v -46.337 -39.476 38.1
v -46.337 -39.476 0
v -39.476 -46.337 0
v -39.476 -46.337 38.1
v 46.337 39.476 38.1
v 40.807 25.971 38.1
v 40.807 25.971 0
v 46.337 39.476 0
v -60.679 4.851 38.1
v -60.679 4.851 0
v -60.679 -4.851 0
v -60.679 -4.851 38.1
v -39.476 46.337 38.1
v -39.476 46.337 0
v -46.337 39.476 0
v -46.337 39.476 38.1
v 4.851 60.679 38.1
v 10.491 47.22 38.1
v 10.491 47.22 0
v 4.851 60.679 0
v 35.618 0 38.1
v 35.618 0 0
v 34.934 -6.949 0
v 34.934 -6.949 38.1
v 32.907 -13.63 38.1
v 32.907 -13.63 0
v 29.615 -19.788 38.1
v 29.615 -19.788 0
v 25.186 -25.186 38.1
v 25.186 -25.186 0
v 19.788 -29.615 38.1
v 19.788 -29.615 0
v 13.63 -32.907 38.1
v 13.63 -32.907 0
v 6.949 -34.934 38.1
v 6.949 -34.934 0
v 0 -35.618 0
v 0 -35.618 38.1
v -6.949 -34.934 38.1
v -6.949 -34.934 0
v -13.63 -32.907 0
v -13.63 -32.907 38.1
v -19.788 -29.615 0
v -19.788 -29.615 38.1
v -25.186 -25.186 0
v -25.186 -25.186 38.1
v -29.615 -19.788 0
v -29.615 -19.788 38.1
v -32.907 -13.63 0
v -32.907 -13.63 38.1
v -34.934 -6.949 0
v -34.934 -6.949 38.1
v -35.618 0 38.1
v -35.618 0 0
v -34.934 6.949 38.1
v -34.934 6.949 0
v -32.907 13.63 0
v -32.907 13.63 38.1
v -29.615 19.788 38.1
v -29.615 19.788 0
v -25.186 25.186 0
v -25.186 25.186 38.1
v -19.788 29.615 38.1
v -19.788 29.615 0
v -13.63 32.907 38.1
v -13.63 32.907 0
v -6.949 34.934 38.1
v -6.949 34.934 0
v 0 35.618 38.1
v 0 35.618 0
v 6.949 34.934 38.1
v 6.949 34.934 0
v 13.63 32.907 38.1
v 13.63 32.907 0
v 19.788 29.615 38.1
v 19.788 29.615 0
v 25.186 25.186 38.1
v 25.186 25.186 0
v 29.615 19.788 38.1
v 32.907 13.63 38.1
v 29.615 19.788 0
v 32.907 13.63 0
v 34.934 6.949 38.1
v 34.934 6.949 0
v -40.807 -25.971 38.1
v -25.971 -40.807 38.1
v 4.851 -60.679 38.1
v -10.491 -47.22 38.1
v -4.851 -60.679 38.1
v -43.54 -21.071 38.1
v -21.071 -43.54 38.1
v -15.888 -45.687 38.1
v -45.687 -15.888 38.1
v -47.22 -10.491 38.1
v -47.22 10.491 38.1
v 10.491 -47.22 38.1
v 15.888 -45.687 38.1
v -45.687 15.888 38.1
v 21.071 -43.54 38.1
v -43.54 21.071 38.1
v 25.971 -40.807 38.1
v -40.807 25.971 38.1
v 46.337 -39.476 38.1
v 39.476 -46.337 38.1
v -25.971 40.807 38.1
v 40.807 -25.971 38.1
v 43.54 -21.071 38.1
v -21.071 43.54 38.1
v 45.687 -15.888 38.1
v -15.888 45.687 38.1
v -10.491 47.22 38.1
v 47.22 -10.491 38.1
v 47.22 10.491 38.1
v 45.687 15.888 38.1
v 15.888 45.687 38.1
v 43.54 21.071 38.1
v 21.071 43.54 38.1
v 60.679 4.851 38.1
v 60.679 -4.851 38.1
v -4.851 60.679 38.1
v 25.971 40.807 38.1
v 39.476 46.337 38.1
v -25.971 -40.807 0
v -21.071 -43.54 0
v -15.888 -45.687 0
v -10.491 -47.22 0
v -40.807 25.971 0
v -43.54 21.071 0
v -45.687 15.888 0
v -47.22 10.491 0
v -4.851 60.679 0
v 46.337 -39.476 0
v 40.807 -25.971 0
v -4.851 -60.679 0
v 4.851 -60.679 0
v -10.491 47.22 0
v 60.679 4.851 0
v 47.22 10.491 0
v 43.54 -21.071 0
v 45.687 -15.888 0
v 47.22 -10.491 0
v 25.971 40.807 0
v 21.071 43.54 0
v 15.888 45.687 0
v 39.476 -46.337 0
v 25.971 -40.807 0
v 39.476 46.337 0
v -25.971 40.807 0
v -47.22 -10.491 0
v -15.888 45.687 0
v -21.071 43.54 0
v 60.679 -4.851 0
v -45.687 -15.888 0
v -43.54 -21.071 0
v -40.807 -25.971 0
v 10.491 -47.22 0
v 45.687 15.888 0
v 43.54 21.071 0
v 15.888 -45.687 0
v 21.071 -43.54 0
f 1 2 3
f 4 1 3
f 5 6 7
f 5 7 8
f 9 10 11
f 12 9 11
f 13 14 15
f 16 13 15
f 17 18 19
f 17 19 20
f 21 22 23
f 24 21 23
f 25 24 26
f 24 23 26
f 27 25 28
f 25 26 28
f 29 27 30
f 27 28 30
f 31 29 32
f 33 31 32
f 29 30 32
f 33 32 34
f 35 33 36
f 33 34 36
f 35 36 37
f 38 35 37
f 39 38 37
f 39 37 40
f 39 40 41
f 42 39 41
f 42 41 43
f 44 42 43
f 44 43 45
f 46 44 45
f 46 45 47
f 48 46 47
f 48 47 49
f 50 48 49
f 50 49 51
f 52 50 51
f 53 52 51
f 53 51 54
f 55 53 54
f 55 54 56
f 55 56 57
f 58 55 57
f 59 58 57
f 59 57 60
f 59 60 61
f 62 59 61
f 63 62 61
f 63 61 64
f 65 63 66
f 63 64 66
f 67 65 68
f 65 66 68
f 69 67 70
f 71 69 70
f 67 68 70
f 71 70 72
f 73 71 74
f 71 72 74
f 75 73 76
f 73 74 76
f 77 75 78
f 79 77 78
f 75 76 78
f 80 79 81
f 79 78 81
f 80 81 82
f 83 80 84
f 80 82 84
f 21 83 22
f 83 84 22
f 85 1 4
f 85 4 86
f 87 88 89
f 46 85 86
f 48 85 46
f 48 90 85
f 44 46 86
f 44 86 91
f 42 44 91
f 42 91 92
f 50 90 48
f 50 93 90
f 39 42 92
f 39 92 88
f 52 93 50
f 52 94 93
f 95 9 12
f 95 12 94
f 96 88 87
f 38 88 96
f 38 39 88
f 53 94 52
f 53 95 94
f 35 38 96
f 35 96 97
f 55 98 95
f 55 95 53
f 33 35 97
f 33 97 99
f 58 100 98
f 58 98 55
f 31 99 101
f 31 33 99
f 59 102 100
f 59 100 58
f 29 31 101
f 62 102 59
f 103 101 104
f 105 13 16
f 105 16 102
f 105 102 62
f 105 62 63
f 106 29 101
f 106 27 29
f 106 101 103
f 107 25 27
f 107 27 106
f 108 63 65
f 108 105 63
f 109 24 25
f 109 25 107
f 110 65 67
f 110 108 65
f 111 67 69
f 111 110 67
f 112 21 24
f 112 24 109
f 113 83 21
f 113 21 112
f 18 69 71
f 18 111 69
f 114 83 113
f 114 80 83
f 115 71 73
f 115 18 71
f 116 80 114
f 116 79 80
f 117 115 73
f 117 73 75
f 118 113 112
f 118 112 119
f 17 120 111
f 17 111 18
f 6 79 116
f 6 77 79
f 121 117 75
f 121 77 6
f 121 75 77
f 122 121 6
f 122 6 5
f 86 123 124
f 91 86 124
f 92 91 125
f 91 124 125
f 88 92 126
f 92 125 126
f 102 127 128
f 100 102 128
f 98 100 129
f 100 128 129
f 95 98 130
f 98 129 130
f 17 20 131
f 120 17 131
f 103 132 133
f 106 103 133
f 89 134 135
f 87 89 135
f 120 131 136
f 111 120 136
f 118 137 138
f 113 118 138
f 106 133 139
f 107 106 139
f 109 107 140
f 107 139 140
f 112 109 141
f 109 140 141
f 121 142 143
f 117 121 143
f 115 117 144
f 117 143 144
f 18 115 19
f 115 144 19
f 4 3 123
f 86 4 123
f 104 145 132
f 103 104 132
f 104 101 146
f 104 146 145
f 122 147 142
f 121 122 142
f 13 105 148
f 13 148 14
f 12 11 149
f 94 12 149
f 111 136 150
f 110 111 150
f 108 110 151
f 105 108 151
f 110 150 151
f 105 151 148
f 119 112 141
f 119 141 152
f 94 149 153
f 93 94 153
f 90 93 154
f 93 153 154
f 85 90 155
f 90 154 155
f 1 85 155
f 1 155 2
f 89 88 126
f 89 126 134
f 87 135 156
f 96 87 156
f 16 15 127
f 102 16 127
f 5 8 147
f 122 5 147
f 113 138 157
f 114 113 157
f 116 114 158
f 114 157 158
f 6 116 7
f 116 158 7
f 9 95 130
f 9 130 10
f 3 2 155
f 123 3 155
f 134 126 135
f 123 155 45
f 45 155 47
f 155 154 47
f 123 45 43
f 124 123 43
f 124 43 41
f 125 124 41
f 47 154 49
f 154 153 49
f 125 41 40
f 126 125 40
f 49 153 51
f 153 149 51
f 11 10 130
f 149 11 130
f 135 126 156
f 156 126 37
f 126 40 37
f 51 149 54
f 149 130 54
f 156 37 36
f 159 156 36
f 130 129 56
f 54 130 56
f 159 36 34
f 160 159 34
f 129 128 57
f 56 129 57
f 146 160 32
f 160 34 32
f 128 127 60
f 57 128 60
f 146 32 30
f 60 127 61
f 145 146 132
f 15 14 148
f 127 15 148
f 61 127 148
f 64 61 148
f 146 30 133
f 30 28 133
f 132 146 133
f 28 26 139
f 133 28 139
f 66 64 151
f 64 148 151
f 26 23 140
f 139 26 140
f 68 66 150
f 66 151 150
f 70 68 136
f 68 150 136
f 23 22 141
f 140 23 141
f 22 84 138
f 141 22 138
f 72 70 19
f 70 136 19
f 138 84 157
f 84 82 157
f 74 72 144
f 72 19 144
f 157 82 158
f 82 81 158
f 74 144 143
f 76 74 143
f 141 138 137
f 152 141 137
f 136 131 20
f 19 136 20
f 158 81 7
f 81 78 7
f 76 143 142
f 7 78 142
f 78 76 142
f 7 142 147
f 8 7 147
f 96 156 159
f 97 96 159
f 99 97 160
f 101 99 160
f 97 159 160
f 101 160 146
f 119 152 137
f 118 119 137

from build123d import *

# Parameters (mm, degrees)
F0_R     = 48.370805
F1_DEPTH = 38.1
F3_DEPTH = 38.1
F4_R     = 35.618168
F5_DEPTH = 66.294


with BuildPart() as f1:
    # F0 (on Top) → F1 (new body)
    with BuildSketch(Plane.XY):
        Circle(F0_R)
    extrude(amount=F1_DEPTH)

    # F2 (on Top) → F3 (join)
    with BuildSketch(Plane.XY):
        Polygon((4.851332, 60.679473), (-4.851332, 60.679473), (-12.616223, 42.146083), (12.616223, 42.146083), align=None)
        Polygon((46.337277, 39.476457), (39.476457, 46.337277), (20.880764, 38.722798), (38.722798, 20.880764), align=None)
        Polygon((60.679473, 4.851332), (42.146083, 12.616223), (42.146083, -12.616223), (60.679473, -4.851332), align=None)
        Polygon((39.476457, -46.337277), (46.337277, -39.476457), (38.722798, -20.880764), (20.880764, -38.722798), align=None)
        Polygon((-4.851332, -60.679473), (4.851332, -60.679473), (12.616223, -42.146083), (-12.616223, -42.146083), align=None)
        Polygon((-46.337277, -39.476457), (-39.476457, -46.337277), (-20.880764, -38.722798), (-38.722798, -20.880764), align=None)
        Polygon((-60.679473, 4.851332), (-60.679473, -4.851332), (-42.146083, -12.616223), (-42.146083, 12.616223), align=None)
        Polygon((-39.476457, 46.337277), (-46.337277, 39.476457), (-38.722798, 20.880764), (-20.880764, 38.722798), align=None)
    extrude(amount=F3_DEPTH)

    # F4 (on face) → F5 (cut)
    with BuildSketch(Plane(origin=(0, 0, 0), x_dir=(1, 0, 0), z_dir=(0, 0, -1))):
        Circle(F4_R)
    extrude(amount=-F5_DEPTH, mode=Mode.SUBTRACT)


solid = f1.part
